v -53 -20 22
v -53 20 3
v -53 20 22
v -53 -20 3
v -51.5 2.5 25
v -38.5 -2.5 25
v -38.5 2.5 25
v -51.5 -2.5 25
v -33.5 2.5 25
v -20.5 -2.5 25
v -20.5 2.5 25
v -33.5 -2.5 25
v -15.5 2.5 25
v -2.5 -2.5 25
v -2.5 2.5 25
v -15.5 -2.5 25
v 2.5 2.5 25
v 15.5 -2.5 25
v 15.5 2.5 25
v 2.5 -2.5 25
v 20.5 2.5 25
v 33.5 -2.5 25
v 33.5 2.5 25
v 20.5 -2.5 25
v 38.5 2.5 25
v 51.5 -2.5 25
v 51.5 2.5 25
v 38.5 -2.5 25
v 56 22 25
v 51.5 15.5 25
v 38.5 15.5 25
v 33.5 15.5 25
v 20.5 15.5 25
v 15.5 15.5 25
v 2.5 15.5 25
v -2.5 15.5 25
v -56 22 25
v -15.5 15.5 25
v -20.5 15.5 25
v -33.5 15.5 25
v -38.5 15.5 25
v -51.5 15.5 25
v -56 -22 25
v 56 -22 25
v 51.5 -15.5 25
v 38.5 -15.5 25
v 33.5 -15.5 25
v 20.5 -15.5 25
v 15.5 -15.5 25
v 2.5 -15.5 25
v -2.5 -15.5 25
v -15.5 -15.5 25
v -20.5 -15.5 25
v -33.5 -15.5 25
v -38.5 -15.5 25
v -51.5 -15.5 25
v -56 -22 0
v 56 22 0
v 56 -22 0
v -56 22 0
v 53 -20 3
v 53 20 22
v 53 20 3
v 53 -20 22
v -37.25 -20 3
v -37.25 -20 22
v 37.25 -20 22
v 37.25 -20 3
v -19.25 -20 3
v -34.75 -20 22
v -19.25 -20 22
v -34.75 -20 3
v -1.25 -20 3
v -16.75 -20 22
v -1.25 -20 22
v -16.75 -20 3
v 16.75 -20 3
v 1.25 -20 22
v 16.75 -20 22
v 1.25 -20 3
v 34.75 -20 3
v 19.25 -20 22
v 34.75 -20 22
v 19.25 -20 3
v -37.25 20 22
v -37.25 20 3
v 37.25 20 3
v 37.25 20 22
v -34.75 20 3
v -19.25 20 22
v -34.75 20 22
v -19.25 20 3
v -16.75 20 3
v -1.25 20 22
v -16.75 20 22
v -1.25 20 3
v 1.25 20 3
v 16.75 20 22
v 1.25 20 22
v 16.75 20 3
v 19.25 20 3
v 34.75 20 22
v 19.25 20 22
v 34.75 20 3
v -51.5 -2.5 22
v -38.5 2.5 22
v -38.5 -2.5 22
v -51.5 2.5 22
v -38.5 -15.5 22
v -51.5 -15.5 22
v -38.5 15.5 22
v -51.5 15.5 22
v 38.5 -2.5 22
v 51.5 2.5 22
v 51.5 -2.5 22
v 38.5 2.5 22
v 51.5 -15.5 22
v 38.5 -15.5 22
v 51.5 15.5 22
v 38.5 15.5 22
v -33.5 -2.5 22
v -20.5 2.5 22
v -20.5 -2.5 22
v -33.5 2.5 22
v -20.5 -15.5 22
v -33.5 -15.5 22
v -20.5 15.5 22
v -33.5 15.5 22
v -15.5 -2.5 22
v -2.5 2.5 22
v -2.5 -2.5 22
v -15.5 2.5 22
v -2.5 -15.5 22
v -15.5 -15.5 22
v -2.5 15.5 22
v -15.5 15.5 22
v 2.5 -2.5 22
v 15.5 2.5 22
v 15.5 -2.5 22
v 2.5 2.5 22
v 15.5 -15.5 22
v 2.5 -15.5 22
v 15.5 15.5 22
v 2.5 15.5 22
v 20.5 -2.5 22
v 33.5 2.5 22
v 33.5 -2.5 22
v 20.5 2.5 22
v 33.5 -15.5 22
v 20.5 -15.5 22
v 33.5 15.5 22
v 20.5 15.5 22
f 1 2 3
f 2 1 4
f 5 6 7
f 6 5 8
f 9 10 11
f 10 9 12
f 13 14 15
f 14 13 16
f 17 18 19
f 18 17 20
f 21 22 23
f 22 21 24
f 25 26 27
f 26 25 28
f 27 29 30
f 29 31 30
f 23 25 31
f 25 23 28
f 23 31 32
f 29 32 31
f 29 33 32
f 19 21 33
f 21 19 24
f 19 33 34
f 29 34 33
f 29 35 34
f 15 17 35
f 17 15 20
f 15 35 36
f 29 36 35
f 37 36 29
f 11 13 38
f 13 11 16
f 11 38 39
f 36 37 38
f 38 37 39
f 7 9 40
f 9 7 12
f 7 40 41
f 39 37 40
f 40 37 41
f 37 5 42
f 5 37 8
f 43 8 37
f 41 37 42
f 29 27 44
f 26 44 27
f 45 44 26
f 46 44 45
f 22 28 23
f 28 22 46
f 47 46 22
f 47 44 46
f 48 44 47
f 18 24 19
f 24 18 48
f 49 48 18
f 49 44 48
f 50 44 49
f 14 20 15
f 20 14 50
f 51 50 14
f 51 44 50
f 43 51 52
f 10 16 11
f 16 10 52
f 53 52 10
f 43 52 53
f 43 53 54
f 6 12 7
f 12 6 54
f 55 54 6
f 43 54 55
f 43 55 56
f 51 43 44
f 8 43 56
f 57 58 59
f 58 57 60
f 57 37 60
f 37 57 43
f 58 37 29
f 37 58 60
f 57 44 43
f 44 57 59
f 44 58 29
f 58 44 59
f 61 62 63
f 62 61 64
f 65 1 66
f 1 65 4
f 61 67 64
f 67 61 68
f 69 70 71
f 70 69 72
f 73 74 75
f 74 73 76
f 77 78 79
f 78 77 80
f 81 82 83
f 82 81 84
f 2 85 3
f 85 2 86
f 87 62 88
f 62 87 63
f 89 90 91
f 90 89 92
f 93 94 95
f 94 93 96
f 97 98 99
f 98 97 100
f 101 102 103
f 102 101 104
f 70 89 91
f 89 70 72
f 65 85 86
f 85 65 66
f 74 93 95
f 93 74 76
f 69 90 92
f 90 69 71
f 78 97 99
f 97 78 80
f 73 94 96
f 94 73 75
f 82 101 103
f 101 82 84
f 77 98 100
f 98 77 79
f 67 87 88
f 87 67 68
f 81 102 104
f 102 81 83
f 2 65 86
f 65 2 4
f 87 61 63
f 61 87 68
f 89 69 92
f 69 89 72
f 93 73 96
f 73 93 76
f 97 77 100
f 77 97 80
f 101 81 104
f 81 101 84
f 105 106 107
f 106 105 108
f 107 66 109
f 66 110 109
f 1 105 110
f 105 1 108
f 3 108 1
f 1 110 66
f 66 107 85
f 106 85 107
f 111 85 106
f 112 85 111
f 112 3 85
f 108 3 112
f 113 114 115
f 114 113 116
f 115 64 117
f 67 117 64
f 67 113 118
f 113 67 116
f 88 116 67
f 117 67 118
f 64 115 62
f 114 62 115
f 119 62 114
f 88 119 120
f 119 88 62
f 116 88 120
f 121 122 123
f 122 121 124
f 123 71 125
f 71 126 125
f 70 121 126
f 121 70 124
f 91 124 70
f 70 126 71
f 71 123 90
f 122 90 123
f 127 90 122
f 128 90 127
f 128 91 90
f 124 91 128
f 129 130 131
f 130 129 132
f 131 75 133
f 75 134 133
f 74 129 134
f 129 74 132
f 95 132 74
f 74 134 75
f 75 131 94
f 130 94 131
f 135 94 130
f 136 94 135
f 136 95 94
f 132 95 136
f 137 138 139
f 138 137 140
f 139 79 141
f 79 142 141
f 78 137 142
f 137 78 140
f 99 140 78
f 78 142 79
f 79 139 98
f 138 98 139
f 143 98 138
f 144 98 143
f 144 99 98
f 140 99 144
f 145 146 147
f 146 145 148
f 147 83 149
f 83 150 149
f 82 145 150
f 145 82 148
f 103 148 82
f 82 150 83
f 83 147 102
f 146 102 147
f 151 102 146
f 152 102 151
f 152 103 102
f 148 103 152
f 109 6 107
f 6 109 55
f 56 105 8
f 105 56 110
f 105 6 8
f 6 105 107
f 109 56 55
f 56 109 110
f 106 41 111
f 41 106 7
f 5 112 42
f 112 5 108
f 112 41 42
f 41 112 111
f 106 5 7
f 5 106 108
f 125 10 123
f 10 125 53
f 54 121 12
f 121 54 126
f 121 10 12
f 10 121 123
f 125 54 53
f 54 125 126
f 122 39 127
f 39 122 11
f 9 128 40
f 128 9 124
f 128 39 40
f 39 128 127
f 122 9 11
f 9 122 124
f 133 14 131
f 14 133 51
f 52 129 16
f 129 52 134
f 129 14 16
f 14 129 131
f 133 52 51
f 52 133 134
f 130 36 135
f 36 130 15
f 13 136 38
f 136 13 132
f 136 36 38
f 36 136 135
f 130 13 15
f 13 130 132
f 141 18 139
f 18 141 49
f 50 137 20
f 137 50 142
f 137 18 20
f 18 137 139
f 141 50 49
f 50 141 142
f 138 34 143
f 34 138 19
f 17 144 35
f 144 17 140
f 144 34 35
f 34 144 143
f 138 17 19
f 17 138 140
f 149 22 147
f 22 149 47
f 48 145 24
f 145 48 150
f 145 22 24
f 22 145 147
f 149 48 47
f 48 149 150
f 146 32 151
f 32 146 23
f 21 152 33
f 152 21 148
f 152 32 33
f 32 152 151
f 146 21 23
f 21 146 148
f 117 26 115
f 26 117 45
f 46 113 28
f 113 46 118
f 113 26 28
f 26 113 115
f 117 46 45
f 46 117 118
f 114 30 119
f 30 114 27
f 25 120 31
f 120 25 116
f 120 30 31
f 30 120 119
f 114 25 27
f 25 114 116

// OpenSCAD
// KNOWN-WRONG PART (must fail): 2 mm walls close the long front and back sides
// Open-sided rack for 12 standard 12.5 mm square cuvettes (2 rows of 6)
// Category: benchware. A base plate and a perforated deck joined by seven upright walls that run
// front to back; the long sides stay open, so the cuvettes can be seen and read in the rack.
// The deck bridges only 15.5 mm between walls, so it prints without supports.
// Print: PLA or PETG, base on the bed, 0.2 mm layers.
// SPDX-License-Identifier: CERN-OHL-P-2.0

/* [Rack] */
plate = [112, 44];        // X, Y of the base plate and the deck [mm]
base_t = 3;               // base plate z = 0 .. 3
deck_z = 22;              // deck from z = 22 ...
deck_t = 3;               // ... to z = 25
end_t = 3;                // end walls, flush with the short ends
rib_t = 2.5;              // inner ribs
rib_x = [-36, -18, 0, 18, 36];
cols = 6;                 // holes along X
rows = 2;                 // holes along Y
pitch = 18;               // centre-to-centre in X and Y
hole = 13;                // square hole for a 12.5 mm cuvette

/* [Hidden] */
eps = 0.01;
H = deck_z + deck_t;

difference() {
    union() {
        translate([-plate.x / 2, -plate.y / 2, 0]) cube([plate.x, plate.y, base_t]);
        translate([-plate.x / 2, -plate.y / 2, deck_z]) cube([plate.x, plate.y, deck_t]);
        for (s = [-1, 1])
            translate([s > 0 ? plate.x / 2 - end_t : -plate.x / 2, -plate.y / 2, 0]) cube([end_t, plate.y, H]);
        for (s = [-1, 1]) translate([-plate.x / 2, s > 0 ? plate.y / 2 - 2 : -plate.y / 2, 0]) cube([plate.x, 2, H]);
        for (x = rib_x)
            translate([x - rib_t / 2, -plate.y / 2, 0]) cube([rib_t, plate.y, H]);
    }
    for (i = [0 : cols - 1], j = [0 : rows - 1])
        translate([(i - (cols - 1) / 2) * pitch - hole / 2, (j - (rows - 1) / 2) * pitch - hole / 2, deck_z - eps])
            cube([hole, hole, deck_t + 2 * eps]);
}
